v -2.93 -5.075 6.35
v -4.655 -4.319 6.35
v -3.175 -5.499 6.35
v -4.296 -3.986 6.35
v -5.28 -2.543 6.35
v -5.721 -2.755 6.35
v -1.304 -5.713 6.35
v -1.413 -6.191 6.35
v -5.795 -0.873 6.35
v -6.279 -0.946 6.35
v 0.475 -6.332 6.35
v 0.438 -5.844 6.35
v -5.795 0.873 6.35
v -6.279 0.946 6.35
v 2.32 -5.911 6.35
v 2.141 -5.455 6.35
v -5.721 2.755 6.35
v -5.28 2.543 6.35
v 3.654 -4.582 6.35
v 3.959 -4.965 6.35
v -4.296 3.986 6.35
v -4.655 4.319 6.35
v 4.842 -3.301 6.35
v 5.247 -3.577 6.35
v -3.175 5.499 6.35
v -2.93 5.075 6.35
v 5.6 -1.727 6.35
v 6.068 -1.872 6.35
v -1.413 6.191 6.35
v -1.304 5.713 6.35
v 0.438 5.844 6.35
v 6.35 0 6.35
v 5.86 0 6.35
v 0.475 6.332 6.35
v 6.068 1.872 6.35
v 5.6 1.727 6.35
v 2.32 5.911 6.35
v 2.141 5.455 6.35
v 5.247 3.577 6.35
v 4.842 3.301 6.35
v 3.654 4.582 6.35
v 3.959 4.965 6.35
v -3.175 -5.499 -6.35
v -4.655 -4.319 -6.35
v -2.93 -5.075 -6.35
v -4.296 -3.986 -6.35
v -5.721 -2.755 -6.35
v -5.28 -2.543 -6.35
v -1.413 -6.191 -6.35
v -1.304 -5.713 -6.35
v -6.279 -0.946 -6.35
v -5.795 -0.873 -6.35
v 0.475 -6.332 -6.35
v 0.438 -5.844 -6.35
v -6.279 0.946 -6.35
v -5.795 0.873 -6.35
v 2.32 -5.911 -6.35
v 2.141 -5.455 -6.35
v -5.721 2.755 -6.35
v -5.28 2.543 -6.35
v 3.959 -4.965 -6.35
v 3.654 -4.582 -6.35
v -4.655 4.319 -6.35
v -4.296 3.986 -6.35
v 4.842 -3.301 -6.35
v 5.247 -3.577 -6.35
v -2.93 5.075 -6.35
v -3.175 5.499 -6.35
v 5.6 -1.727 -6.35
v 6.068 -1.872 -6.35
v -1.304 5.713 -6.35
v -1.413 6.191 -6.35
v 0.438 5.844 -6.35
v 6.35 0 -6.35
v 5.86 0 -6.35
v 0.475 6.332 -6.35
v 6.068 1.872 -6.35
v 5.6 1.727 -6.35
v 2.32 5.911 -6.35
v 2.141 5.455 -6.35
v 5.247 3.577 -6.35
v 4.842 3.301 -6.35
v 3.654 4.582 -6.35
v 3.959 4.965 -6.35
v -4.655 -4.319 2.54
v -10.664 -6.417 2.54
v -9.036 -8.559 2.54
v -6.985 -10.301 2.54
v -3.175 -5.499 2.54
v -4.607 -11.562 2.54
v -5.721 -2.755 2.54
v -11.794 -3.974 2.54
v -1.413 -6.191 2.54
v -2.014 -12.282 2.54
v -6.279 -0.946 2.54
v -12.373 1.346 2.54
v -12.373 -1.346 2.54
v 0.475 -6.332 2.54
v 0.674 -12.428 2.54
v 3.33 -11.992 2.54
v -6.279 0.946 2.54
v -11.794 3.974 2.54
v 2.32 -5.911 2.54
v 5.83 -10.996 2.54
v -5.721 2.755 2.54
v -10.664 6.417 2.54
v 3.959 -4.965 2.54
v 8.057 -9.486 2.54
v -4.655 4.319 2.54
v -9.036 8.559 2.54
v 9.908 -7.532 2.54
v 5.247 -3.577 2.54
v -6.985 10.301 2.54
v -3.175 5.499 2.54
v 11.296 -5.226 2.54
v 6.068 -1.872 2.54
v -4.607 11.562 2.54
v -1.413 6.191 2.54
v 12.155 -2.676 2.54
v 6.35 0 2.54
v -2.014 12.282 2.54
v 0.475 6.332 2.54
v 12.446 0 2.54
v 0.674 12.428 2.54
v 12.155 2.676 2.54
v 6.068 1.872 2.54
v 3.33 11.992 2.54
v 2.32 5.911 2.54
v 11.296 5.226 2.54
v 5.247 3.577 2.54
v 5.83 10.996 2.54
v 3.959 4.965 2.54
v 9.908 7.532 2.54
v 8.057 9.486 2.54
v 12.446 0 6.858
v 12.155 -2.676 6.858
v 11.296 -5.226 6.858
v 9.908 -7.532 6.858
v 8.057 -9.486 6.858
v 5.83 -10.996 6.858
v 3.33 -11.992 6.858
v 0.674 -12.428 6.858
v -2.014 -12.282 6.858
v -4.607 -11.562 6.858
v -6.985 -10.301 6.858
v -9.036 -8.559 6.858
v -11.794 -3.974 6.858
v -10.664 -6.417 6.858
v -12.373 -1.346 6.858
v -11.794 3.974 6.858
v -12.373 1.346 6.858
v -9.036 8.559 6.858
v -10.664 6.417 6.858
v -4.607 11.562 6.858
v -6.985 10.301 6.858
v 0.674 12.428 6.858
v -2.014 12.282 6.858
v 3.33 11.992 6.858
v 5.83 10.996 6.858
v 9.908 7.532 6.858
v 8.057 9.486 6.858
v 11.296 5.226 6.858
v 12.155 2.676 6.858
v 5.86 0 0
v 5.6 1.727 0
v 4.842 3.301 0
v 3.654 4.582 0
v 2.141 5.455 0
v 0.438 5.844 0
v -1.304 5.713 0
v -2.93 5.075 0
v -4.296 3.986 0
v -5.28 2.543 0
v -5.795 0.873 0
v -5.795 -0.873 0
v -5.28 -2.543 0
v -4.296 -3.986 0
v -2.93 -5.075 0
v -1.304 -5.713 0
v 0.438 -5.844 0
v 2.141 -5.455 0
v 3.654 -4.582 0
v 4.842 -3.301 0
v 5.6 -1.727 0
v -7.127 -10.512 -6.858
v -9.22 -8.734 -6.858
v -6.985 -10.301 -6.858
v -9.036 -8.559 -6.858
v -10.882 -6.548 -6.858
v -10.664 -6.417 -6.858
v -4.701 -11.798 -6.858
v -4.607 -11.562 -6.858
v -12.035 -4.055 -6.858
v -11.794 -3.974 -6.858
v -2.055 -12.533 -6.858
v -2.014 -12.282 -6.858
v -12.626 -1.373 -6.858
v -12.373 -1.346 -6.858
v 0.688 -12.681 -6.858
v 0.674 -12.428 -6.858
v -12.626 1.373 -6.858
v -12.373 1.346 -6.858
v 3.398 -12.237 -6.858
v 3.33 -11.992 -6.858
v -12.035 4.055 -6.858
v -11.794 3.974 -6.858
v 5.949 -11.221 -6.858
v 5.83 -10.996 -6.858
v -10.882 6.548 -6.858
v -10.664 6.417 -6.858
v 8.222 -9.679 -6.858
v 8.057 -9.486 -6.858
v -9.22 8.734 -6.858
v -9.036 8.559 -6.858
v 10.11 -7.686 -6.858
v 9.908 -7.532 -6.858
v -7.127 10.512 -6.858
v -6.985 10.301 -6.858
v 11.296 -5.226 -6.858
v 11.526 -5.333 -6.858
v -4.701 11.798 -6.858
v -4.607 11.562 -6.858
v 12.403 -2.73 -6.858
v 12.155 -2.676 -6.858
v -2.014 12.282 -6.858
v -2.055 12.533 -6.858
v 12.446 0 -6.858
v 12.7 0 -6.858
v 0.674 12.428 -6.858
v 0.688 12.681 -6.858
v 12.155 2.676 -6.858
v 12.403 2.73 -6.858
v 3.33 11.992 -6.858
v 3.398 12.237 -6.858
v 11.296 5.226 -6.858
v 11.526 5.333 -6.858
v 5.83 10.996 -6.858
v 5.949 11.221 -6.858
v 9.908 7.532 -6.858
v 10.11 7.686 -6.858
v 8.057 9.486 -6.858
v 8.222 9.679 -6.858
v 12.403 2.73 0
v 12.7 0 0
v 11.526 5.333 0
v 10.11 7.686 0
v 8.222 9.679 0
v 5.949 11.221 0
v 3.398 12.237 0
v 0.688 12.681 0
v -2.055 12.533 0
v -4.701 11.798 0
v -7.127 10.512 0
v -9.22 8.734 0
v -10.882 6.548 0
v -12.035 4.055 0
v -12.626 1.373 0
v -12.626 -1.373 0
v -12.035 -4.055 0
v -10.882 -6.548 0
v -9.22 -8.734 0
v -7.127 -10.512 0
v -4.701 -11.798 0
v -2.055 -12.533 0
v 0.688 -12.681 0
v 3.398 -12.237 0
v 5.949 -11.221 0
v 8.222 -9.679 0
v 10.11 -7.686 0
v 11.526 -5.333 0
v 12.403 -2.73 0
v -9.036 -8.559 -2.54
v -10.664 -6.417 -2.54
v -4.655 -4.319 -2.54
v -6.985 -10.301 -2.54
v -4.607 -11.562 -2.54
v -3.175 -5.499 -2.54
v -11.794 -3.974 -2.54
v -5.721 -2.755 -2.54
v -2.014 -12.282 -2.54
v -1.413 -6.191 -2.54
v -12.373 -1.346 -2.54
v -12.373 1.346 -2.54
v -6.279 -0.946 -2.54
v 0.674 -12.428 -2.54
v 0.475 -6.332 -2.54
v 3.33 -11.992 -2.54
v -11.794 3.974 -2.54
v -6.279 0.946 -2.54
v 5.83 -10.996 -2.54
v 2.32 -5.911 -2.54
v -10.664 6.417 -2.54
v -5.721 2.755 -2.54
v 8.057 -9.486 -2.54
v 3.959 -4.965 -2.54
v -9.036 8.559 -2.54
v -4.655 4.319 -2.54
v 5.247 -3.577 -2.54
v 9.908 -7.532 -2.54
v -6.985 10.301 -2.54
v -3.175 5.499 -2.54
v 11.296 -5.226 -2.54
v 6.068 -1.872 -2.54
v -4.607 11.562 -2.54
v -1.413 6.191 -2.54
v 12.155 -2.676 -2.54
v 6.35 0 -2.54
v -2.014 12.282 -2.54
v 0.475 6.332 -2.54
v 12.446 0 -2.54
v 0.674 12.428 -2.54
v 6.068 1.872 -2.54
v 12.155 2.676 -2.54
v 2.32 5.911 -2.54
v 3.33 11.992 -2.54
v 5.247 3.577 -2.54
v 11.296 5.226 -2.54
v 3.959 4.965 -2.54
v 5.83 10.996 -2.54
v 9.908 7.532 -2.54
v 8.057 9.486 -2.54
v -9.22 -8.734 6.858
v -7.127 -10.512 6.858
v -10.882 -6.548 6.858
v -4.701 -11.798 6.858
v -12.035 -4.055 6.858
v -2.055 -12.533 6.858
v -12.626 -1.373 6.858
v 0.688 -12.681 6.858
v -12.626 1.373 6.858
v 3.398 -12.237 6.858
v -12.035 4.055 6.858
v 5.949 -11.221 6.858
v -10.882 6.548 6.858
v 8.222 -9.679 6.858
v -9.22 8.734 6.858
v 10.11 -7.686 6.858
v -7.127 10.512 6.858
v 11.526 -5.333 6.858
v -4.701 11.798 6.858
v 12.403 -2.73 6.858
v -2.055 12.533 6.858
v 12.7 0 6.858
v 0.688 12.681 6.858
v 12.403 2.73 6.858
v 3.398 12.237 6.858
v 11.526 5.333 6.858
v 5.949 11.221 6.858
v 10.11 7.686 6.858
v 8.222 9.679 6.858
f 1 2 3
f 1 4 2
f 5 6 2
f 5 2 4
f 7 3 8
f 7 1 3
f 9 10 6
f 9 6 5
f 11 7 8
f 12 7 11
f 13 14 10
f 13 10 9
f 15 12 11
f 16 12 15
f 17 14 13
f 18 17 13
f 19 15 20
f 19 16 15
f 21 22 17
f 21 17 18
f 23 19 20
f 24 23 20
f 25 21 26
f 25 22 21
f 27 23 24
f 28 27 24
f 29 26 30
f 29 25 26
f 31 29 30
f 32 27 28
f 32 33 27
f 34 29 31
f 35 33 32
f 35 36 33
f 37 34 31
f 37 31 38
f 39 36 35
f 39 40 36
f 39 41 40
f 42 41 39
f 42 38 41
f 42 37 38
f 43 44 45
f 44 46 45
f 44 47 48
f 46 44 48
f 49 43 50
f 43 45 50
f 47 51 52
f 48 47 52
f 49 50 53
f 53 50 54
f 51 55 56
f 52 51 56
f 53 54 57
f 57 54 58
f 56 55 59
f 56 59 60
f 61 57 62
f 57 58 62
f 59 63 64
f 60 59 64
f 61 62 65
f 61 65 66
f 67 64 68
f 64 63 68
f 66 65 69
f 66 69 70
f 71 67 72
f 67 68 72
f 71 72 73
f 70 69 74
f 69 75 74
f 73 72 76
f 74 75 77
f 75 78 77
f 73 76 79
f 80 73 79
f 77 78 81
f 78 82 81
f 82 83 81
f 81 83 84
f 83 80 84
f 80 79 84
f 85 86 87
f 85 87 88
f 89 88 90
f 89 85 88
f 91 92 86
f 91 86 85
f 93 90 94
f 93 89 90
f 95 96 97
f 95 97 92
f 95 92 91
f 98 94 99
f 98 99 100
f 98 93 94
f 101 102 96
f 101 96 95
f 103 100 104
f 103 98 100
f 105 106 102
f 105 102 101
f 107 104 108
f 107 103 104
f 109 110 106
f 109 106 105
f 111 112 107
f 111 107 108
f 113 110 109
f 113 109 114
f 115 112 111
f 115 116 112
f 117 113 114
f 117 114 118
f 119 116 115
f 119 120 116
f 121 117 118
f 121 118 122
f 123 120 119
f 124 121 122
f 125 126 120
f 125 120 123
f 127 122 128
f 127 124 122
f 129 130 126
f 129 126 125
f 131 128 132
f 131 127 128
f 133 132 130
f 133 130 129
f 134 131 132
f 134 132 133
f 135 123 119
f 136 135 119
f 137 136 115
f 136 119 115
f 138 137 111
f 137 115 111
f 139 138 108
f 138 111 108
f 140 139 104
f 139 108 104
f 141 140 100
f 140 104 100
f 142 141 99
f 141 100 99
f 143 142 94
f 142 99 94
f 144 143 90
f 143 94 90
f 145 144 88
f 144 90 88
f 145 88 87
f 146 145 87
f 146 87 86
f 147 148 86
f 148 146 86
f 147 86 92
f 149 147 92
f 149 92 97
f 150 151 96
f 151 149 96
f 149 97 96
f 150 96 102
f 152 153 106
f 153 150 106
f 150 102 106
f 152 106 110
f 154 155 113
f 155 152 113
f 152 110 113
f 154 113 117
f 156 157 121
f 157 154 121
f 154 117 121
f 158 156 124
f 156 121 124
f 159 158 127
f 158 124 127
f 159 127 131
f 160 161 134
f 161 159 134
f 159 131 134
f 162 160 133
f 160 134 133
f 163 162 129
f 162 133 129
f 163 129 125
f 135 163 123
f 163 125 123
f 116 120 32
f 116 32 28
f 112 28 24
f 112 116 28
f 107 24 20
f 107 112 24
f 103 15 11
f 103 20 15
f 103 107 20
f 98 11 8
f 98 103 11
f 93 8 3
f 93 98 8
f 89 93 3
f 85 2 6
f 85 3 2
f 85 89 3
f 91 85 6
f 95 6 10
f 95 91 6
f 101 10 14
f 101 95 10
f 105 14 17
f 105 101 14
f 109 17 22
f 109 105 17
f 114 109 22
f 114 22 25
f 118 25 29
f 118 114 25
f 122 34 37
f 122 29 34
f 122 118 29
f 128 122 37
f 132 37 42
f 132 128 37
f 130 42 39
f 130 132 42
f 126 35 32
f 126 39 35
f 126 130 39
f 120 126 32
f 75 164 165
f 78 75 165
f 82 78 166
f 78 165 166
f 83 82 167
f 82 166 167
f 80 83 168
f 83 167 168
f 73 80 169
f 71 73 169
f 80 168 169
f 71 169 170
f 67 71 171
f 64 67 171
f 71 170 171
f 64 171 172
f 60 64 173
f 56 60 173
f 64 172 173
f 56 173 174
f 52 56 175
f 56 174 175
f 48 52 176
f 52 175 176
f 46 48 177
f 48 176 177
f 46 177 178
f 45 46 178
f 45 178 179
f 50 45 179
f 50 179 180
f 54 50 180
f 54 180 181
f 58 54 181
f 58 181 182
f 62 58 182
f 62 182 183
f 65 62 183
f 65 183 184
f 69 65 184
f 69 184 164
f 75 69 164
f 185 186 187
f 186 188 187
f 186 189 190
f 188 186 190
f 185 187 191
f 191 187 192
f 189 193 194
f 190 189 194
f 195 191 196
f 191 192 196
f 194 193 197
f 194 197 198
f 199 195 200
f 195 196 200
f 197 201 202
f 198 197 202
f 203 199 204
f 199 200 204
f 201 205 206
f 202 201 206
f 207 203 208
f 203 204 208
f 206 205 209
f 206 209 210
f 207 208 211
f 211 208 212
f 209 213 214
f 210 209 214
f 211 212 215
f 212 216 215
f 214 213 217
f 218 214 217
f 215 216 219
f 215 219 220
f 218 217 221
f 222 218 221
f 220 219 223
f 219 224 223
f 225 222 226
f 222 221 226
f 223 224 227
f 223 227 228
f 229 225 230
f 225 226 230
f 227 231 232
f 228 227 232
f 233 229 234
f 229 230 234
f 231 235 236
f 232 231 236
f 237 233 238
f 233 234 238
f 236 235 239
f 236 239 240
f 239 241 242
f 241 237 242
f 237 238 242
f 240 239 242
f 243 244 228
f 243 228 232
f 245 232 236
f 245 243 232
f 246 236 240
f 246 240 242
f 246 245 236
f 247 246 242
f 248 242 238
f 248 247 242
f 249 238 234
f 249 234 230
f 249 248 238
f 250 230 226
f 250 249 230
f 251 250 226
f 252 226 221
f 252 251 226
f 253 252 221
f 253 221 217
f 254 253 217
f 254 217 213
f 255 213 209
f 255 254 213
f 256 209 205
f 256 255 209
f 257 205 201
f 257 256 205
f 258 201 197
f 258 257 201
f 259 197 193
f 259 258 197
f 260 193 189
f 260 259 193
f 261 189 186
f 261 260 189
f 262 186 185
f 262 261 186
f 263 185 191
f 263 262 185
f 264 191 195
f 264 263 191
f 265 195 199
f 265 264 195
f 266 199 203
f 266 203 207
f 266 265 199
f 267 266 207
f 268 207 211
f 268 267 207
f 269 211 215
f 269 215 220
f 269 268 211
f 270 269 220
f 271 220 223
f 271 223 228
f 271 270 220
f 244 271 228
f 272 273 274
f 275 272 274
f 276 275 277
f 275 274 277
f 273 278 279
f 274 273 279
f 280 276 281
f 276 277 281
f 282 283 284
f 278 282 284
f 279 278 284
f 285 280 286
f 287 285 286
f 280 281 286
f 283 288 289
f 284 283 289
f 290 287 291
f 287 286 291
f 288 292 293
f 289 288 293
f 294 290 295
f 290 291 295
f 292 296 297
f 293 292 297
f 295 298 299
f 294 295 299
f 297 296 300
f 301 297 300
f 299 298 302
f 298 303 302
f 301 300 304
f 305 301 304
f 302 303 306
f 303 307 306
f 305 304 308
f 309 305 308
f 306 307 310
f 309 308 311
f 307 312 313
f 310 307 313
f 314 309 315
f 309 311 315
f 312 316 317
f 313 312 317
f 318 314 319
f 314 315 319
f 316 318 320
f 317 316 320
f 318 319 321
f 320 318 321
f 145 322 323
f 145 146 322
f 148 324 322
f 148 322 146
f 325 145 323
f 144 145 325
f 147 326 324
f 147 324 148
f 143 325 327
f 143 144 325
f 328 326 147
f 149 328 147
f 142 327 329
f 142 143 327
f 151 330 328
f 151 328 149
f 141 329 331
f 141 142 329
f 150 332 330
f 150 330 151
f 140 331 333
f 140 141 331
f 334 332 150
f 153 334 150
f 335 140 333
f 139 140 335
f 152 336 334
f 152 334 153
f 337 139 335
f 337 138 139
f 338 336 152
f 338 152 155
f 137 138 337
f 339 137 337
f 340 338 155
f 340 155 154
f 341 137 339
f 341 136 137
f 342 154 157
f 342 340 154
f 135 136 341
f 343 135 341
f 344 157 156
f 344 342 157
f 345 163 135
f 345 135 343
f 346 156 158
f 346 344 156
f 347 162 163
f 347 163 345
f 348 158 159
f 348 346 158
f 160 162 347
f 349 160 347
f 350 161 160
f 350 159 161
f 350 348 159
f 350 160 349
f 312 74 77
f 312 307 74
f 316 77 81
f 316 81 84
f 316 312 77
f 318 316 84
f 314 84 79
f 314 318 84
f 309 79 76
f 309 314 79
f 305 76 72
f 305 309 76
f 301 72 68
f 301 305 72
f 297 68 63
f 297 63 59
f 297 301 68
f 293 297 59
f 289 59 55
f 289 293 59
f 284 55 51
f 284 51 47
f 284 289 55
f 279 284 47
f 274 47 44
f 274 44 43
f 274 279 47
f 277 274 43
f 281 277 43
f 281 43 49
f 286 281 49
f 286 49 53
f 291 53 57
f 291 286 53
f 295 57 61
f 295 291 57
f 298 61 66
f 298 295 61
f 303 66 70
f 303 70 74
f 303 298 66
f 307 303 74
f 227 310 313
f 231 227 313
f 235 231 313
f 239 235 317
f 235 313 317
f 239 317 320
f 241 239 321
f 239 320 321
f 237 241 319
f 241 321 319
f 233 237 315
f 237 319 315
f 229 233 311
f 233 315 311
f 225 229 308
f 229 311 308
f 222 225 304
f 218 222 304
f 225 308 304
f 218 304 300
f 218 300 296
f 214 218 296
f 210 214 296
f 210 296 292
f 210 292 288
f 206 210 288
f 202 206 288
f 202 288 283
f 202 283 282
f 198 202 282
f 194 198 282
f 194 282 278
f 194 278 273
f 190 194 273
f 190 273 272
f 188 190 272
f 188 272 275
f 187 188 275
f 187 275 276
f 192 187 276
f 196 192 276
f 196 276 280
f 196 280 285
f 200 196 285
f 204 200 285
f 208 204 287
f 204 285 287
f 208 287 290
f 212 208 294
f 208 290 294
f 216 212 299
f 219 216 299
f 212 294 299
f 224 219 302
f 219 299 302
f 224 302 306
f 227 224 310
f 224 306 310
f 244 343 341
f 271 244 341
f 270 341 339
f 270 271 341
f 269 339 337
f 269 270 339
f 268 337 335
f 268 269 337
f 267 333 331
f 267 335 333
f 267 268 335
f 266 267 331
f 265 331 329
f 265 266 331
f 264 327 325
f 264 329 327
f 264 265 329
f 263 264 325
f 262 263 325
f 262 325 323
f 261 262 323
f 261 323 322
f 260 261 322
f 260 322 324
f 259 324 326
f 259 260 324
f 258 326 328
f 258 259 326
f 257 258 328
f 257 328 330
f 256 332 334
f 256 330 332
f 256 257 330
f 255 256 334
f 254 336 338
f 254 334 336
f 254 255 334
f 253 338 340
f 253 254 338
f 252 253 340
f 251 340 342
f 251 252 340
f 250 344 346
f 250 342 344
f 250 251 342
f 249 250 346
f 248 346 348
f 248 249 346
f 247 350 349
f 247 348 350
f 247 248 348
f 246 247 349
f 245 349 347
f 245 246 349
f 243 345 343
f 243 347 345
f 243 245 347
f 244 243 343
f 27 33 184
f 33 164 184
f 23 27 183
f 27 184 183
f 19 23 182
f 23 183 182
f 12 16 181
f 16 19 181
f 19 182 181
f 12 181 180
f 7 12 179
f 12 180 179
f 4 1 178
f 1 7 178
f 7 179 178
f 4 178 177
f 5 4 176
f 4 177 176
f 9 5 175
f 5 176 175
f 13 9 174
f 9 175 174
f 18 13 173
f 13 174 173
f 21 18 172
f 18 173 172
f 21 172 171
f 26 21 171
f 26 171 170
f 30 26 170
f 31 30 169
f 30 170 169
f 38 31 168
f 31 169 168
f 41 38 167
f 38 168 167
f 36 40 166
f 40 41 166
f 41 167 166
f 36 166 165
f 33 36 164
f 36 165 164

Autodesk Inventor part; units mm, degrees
ref_plane "YZ Plane" through (0, 0, 0) normal (1, 0, 0) x (0, 1, 0)
ref_plane "XZ Plane" through (0, 0, 0) normal (0, 1, 0) x (-1, 0, 0)
ref_plane "XY Plane" through (0, 0, 0) normal (0, 0, 1) x (1, 0, 0)
sketch "Sketch1" plane through (0, 0, 0) normal (0, 0, 1) x (1, 0, 0)
  circle A0 centre (0, 0) radius 12.7
  circle A1 centre (0, 0) radius 12.446
  circle A2 centre (0, 0) radius 6.35
  circle A3 centre (0, 0) radius 5.8601
  dimension "d1" = 25.4
  dimension "d2" = 24.892
  dimension "d3" = 12.7
extrude "Extrusion1" [suppressed]
extrude "Extrusion2" add sketch "Sketch1" along normal blind 6.858 and the other way blind 6.858 contours A0
extrude "Extrusion3" add sketch "Sketch1" along normal blind 2.54 and the other way blind 2.54 contours A1
extrude "Extrusion4" add sketch "Sketch1" along normal blind 6.35 and the other way blind 6.35 contours A2
fillet "Fillet1" [suppressed]
properties part number "plastic idler wheel base part"
